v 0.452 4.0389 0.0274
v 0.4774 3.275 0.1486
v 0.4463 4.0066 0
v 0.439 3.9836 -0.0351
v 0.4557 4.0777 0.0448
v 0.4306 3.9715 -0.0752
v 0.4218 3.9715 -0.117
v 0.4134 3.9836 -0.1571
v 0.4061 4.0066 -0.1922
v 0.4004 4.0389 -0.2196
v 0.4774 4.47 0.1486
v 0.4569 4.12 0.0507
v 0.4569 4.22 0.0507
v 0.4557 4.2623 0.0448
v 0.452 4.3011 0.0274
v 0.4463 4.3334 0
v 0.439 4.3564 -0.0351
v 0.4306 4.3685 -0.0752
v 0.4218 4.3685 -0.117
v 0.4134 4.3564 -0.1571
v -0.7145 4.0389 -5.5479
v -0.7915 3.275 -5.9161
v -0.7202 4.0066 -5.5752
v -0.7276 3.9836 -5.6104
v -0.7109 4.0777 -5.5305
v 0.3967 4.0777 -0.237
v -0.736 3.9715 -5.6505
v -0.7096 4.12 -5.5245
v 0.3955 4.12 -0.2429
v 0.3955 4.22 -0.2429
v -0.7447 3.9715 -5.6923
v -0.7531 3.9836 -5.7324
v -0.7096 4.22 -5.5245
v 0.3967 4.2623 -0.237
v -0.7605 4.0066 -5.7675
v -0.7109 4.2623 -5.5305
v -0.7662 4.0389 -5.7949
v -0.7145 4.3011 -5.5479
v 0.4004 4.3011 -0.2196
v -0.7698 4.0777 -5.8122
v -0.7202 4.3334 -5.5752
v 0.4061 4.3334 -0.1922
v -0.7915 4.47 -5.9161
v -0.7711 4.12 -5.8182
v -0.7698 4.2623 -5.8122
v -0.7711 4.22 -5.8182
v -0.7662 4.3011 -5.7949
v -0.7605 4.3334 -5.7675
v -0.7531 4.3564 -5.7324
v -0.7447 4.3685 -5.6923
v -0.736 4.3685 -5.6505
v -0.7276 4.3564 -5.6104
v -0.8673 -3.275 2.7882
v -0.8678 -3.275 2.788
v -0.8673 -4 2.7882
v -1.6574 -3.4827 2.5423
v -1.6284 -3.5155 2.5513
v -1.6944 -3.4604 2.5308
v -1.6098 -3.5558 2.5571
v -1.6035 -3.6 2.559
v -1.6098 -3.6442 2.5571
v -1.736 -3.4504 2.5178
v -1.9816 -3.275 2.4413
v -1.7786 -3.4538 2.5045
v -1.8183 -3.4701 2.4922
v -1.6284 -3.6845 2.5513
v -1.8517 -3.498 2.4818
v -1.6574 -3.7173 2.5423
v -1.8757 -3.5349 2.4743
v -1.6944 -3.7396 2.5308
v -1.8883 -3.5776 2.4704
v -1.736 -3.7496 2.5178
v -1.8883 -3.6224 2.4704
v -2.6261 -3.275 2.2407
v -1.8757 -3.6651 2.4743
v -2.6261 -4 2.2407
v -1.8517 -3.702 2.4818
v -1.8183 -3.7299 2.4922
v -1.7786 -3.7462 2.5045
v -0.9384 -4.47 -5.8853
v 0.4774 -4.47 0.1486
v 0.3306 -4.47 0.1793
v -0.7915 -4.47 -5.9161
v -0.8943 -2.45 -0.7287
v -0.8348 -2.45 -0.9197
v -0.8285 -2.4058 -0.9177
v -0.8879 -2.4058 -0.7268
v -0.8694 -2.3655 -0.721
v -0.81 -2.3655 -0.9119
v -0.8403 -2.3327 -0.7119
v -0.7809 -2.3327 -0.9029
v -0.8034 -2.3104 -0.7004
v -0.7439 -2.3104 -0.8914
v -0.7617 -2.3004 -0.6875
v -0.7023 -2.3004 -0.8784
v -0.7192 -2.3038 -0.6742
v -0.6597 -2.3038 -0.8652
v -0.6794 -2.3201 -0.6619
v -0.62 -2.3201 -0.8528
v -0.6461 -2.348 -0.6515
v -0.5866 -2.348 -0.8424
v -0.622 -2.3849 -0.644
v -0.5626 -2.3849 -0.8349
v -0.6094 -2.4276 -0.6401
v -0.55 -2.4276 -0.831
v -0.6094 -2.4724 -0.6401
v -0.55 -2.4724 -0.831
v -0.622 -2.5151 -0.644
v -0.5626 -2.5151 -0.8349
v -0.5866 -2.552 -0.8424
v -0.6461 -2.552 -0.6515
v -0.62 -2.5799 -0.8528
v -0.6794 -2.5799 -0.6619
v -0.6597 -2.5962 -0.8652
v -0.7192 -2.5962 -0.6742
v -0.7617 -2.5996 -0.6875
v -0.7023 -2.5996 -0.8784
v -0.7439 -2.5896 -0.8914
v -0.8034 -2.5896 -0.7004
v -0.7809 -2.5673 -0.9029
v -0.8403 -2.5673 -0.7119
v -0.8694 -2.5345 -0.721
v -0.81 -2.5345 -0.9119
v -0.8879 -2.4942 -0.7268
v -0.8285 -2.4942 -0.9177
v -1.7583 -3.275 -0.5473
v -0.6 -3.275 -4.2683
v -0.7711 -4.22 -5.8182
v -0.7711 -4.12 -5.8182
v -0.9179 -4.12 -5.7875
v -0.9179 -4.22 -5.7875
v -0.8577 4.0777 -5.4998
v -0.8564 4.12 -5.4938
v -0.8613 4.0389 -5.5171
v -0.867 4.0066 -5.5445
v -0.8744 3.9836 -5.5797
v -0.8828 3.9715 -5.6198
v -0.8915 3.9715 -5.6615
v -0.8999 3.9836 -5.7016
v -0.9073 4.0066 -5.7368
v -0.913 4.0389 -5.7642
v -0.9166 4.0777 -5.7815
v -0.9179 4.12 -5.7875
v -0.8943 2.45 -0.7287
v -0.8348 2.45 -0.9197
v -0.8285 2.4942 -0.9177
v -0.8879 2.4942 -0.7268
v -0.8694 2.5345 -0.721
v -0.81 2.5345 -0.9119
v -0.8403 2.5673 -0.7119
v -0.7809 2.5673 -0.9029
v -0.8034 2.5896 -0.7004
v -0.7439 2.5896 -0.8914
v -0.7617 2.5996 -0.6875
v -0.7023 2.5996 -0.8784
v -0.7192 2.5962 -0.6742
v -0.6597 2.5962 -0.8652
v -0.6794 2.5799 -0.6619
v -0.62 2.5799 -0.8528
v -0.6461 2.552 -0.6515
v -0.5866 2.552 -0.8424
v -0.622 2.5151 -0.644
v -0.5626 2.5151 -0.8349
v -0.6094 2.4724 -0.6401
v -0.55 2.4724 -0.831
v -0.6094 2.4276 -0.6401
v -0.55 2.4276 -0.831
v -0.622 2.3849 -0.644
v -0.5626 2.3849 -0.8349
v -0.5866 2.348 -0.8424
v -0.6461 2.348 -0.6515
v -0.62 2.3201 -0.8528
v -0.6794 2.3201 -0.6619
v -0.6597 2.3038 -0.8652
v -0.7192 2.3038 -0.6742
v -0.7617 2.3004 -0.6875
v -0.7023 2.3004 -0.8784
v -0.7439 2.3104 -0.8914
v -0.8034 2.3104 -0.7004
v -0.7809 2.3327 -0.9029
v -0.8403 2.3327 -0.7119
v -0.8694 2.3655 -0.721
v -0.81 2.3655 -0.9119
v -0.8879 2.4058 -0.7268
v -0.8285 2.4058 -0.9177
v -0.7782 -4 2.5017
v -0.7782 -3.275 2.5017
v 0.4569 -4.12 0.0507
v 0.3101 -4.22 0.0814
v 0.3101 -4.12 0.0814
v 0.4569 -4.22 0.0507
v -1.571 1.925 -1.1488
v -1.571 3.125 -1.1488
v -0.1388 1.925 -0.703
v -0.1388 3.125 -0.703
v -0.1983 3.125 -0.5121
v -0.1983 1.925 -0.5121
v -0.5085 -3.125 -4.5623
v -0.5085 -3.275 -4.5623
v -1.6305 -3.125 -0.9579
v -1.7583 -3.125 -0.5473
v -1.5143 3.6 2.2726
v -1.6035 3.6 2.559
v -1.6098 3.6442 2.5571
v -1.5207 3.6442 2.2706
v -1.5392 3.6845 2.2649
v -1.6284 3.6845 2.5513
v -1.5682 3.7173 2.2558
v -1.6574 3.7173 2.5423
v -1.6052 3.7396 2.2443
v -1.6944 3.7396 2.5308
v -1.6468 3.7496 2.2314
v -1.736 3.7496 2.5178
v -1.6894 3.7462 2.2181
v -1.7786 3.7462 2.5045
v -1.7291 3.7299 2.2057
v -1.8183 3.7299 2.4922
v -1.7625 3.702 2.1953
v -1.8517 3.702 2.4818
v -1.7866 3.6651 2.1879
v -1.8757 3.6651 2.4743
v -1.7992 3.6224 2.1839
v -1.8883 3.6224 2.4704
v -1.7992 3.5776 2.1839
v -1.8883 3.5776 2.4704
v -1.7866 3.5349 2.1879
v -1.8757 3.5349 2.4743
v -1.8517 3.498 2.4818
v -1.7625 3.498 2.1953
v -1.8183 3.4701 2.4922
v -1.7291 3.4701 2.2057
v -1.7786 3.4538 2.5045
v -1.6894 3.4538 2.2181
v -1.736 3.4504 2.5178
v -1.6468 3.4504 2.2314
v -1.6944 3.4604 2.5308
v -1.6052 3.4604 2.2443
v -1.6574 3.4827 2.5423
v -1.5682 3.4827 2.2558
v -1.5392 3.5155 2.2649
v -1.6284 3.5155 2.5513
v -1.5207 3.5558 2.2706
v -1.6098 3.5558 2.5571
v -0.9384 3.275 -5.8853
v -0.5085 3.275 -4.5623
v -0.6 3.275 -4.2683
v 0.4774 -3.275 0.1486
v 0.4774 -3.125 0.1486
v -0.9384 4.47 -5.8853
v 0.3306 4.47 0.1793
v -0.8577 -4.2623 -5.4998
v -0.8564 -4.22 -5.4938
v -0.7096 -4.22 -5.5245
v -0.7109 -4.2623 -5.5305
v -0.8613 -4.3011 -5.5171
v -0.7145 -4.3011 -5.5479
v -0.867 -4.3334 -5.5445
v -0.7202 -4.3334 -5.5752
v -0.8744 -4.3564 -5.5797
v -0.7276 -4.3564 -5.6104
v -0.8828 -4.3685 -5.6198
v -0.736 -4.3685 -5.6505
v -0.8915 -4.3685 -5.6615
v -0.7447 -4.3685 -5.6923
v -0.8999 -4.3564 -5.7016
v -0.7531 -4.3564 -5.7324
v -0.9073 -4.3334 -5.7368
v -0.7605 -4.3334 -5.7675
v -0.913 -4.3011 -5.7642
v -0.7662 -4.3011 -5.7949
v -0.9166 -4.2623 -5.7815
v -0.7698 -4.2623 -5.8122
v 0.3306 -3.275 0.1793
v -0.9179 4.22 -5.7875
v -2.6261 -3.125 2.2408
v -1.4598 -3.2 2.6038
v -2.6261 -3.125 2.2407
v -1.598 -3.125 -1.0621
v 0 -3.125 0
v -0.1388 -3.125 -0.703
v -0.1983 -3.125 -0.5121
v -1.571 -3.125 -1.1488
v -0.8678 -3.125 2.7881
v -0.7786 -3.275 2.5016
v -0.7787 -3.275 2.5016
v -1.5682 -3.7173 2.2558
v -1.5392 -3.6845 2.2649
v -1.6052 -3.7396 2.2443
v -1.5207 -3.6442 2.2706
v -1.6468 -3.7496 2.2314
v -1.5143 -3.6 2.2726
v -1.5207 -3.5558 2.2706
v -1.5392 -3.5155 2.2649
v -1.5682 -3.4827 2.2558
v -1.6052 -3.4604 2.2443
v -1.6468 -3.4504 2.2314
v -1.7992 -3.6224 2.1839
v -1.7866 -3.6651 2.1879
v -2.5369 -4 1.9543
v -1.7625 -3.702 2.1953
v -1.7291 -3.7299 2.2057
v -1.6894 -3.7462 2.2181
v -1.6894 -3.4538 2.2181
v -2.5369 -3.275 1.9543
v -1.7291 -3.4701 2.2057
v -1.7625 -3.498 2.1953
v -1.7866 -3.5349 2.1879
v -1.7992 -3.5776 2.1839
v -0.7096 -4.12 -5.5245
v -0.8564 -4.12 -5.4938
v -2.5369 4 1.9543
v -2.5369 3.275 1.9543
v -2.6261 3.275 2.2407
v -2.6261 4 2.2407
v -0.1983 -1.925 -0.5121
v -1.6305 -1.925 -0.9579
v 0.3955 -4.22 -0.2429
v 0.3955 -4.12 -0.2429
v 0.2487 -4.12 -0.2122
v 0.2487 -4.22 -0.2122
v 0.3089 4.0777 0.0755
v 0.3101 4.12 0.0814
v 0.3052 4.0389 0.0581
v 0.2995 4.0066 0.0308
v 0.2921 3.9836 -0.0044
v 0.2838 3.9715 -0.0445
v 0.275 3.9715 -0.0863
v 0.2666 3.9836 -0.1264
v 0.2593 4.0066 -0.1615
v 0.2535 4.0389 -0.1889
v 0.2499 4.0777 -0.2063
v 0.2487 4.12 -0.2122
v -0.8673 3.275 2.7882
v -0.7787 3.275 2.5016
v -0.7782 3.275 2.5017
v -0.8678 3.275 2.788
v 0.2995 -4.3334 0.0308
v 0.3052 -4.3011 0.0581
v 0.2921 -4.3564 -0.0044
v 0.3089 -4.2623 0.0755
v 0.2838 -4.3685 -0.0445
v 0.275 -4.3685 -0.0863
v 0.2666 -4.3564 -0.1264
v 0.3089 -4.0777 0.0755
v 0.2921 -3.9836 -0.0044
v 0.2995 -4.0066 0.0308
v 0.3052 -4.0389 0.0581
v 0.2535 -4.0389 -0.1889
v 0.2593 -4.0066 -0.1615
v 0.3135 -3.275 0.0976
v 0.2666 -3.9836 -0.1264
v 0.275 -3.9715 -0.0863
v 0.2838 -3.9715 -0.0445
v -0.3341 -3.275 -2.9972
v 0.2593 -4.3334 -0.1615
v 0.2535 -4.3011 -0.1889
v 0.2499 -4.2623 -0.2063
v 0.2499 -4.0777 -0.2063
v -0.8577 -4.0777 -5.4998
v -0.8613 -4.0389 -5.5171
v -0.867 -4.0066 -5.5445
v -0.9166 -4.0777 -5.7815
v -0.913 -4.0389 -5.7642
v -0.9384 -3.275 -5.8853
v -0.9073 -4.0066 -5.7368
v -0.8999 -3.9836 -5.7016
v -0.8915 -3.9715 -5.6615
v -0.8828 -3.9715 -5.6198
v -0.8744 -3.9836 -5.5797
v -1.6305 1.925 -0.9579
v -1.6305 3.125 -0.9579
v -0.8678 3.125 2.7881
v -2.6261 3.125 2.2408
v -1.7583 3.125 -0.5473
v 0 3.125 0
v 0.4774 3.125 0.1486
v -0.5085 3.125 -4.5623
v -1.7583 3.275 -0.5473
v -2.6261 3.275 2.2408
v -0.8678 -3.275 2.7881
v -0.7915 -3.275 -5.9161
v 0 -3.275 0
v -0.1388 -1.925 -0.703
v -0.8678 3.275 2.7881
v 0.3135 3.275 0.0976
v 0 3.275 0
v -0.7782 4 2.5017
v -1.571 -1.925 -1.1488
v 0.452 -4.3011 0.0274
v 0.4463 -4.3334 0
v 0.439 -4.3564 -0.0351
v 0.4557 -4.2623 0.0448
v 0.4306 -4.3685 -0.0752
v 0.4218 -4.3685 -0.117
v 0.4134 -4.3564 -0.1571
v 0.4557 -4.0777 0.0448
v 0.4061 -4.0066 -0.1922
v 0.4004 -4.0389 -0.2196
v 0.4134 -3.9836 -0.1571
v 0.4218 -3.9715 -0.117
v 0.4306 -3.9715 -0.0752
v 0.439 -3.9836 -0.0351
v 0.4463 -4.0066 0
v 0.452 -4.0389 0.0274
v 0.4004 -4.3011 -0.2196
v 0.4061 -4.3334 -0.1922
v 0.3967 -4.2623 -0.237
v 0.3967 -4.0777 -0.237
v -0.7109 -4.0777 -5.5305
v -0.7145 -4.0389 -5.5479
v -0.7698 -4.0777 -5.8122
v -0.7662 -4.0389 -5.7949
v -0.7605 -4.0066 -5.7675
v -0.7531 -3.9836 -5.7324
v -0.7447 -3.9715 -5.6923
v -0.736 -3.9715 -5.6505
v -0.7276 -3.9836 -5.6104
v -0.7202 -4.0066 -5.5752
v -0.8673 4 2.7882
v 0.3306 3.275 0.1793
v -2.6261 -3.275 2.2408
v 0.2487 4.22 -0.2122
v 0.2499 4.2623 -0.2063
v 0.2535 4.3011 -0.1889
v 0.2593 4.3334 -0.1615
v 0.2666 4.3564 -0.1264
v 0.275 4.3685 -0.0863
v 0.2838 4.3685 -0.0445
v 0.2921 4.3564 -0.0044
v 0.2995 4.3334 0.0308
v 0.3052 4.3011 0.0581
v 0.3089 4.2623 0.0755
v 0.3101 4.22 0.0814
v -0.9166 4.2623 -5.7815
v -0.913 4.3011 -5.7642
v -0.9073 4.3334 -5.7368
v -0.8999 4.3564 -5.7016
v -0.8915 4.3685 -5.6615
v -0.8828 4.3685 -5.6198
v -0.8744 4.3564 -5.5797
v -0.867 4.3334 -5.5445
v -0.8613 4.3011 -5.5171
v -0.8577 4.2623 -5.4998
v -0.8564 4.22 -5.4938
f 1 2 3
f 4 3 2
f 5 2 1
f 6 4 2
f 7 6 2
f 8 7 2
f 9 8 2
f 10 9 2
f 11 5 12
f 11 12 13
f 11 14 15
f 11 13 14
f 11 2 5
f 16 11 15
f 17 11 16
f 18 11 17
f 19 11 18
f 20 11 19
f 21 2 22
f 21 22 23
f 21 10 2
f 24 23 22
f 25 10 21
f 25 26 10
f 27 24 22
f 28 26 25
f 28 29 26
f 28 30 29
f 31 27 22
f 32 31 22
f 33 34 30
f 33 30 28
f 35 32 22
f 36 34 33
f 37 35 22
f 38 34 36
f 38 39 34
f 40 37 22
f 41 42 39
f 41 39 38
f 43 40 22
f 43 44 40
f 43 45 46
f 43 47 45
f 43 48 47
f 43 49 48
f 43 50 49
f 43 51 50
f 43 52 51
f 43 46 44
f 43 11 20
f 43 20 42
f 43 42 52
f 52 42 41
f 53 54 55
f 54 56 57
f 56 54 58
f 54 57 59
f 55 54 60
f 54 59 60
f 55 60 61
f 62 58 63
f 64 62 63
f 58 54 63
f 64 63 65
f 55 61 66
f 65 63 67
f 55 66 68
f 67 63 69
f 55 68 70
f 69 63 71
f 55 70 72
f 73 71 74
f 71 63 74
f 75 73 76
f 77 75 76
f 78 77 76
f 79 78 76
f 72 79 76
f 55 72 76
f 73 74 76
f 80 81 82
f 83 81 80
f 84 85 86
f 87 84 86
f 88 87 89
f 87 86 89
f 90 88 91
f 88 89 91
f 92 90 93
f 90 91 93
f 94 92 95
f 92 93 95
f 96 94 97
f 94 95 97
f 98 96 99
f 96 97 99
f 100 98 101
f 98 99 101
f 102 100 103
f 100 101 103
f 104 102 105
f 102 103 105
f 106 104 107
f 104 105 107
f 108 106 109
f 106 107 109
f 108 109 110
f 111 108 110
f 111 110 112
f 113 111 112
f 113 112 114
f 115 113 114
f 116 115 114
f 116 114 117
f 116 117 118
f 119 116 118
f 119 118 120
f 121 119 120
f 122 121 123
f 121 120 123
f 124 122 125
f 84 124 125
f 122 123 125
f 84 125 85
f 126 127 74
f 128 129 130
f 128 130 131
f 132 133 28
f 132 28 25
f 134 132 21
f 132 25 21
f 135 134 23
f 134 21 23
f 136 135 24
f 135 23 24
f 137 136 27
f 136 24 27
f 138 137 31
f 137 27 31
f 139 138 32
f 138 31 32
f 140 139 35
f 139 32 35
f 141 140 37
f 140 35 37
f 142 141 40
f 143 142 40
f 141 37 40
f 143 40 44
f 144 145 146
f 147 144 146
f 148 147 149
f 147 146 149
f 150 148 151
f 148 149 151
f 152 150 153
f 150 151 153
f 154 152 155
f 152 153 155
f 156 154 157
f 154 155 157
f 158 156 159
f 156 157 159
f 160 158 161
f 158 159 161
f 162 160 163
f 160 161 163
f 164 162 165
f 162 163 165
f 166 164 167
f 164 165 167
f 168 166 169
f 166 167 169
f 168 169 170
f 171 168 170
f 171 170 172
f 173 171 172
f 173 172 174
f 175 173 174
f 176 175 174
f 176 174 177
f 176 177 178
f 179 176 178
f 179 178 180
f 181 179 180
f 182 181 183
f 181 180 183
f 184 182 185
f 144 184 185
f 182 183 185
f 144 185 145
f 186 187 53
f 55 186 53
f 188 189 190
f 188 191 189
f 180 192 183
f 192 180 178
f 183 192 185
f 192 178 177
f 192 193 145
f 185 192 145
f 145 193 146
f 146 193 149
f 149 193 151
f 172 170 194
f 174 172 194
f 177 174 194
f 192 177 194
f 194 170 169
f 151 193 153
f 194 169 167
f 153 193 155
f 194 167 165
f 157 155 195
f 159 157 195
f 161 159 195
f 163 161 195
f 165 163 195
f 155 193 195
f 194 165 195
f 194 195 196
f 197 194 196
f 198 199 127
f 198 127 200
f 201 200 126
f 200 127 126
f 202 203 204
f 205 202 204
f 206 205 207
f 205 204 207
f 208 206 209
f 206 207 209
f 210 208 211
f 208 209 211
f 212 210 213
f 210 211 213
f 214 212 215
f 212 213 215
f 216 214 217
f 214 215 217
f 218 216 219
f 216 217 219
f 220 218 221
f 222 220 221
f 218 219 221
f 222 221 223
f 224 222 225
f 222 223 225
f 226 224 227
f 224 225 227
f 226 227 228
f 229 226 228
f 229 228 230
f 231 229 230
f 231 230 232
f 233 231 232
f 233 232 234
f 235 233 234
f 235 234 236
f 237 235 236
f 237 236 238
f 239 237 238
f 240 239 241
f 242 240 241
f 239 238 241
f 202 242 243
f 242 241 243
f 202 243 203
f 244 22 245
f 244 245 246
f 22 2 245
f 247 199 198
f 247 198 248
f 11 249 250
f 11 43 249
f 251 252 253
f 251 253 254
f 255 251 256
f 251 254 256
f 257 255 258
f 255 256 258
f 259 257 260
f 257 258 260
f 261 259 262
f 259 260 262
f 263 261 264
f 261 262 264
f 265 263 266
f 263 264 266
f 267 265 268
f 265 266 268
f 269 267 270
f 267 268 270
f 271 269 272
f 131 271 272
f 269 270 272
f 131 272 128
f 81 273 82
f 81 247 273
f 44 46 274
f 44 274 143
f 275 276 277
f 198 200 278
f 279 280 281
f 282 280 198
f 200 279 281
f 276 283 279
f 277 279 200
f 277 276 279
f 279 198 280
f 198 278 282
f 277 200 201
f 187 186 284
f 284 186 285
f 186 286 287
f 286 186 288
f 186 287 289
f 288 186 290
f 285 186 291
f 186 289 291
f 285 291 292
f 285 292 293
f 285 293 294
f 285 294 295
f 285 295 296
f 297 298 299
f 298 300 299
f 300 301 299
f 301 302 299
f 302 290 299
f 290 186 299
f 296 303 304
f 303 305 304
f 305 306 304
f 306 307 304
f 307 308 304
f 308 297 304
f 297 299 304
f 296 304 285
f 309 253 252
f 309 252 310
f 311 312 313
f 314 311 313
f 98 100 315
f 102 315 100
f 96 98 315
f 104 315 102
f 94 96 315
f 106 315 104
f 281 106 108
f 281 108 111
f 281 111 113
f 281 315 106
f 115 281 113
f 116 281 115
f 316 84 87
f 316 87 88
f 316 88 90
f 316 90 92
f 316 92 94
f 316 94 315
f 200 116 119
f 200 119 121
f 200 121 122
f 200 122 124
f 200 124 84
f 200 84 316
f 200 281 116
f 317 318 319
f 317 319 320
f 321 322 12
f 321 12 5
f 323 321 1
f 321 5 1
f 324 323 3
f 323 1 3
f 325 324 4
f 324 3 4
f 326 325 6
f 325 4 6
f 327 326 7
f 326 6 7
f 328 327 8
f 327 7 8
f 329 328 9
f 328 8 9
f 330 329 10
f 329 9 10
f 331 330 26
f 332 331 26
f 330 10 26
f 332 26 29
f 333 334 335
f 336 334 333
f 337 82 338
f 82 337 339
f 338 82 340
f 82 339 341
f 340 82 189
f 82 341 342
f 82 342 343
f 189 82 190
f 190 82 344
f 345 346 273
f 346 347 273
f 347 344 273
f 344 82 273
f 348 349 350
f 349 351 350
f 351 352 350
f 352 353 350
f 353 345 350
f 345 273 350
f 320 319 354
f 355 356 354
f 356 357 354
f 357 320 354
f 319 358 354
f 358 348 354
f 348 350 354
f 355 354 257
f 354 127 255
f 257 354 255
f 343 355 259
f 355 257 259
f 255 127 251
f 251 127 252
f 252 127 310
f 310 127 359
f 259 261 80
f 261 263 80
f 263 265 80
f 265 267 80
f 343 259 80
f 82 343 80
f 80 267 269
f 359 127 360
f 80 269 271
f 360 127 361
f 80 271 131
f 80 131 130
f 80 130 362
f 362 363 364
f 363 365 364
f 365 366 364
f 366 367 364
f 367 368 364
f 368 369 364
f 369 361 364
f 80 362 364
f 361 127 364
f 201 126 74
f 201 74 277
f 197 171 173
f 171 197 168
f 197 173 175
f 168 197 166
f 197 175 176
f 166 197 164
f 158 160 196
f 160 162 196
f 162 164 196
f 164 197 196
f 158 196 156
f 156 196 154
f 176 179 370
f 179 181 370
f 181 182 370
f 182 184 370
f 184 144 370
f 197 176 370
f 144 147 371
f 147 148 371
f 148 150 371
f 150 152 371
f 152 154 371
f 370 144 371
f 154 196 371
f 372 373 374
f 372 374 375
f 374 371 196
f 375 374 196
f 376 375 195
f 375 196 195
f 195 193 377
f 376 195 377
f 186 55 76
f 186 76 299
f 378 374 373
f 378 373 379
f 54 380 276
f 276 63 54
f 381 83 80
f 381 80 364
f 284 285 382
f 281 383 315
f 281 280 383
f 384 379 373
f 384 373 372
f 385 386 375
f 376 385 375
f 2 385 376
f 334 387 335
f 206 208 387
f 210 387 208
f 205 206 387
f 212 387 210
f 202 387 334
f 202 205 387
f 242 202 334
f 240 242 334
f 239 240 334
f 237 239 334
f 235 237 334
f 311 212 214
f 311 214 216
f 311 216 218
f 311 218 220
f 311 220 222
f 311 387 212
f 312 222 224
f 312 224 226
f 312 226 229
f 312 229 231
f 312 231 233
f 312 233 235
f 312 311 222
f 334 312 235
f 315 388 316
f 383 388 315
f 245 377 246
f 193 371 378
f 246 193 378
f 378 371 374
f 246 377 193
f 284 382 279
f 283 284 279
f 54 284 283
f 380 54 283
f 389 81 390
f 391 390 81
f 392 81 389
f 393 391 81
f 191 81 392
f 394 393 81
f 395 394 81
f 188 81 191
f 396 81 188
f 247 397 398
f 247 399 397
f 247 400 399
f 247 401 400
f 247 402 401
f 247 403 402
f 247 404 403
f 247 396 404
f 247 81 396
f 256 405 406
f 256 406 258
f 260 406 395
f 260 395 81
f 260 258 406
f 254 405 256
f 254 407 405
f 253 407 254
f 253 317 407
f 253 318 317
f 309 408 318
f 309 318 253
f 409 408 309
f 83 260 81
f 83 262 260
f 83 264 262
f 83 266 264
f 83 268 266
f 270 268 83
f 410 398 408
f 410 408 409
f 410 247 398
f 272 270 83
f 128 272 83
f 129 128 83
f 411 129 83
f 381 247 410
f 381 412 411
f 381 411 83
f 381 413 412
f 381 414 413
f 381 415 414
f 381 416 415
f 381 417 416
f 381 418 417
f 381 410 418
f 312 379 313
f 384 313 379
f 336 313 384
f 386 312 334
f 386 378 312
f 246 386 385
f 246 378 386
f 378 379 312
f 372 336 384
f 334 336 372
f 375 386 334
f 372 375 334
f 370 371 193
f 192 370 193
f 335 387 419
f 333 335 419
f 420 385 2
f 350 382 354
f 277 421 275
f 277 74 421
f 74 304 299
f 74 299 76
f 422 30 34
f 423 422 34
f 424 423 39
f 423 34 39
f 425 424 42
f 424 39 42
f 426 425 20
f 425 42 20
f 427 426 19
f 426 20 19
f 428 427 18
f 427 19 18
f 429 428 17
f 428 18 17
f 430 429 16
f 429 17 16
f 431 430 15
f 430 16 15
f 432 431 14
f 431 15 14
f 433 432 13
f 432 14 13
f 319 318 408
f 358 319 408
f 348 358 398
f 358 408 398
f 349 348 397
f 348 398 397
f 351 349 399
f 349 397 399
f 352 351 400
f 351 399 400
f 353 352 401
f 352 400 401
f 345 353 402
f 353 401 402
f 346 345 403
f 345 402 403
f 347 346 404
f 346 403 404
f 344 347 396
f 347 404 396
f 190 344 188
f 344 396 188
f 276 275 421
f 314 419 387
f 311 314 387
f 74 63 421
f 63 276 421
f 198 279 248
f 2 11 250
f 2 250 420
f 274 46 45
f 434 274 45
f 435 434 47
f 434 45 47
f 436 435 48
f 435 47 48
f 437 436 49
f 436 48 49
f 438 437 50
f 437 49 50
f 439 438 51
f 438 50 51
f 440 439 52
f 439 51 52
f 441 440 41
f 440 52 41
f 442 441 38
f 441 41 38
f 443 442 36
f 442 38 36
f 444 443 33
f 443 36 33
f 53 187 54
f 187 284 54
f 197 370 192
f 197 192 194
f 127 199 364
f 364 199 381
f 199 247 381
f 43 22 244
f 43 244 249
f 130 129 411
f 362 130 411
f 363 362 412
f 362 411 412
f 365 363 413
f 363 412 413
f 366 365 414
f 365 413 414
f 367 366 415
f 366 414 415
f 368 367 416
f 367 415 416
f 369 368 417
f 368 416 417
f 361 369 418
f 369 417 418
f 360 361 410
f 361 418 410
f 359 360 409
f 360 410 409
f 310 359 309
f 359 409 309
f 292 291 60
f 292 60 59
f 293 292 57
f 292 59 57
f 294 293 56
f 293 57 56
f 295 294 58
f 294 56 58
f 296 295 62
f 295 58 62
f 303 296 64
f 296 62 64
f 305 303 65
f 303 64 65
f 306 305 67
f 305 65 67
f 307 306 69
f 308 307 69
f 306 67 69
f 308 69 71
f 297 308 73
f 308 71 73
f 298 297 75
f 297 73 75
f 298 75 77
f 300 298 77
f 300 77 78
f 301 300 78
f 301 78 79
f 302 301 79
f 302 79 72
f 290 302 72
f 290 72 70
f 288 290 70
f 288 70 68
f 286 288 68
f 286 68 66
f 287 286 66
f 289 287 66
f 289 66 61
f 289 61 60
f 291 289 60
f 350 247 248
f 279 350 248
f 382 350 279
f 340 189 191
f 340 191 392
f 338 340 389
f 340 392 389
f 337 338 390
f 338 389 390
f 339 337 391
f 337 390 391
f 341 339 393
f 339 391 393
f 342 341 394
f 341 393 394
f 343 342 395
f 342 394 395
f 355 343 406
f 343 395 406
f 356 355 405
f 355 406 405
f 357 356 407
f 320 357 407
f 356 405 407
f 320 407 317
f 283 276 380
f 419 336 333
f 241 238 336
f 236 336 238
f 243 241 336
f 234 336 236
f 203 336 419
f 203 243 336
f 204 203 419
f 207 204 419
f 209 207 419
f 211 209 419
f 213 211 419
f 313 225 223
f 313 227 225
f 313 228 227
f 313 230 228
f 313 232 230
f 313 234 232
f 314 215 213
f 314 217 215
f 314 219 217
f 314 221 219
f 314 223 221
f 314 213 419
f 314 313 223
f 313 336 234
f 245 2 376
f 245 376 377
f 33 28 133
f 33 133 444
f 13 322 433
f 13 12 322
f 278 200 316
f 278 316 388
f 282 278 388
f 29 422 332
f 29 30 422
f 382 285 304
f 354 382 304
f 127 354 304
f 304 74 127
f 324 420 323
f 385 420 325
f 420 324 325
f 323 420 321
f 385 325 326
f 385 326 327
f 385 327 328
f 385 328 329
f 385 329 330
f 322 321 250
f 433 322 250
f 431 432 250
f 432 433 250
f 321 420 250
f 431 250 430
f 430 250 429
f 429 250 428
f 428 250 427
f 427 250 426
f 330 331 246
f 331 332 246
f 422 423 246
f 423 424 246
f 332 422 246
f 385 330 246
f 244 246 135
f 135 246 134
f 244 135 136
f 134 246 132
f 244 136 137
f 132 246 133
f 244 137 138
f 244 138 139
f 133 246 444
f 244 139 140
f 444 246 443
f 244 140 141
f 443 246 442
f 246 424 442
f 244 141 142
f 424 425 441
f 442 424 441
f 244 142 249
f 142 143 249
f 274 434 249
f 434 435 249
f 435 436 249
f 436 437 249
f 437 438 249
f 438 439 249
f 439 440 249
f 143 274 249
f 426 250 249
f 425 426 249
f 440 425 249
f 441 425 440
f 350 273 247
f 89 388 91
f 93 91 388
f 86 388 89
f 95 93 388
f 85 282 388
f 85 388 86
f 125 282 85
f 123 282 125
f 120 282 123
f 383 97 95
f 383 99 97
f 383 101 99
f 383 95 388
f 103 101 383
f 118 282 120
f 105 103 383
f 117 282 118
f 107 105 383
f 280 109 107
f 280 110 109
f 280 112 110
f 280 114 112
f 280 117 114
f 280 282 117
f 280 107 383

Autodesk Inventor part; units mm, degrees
ref_plane "Plano de trabajo1" through (0, 3.2, 0) normal (0, 1, 0) x (-1, 0, 0)
ref_plane "Plano de trabajo2" through (0, -3.2, 0) normal (0, 1, 0) x (-1, 0, 0)
sketch "Boceto3" plane through (0, 3.2, 0) normal (0, 1, 0) x (-1, 0, 0)
  line L0 (0, -6.196) -> (0, 0) projected
  line L1 (0, -6.196) -> (1.7583, -0.5473) projected
  line L2 (1.7583, -0.5473) -> (0, 0) projected
sketch "Boceto4" plane through (0, -3.2, 0) normal (0, 1, 0) x (-1, 0, 0)
  line L0 (0, -6.196) -> (0, 0) projected
  line L1 (0, -6.196) -> (1.7583, -0.5473) projected
  line L2 (1.7583, -0.5473) -> (0, 0) projected
extrude "Extrusión3" add sketch "Boceto4" along normal mid plane 0.15
extrude "Extrusión4" add sketch "Boceto3" along normal mid plane 0.15
ref_plane "Plano de trabajo3" through (0, -3.275, 0) normal (-0.2972, 0, 0.9548) x (0.9548, 0, 0.2972)
sketch "Boceto7" plane through (0, -3.275, 0) normal (-0.2972, 0, 0.9548) x (0.9548, 0, 0.2972)
  line L0 (-1.8415, 0.15) -> (0, 0.15) projected
  line L1 (-1.8415, 0) -> (-1.8415, 0.15) projected
  line L2 (0, 0) -> (-1.8415, 0) projected
  line L3 (-1.8415, 6.55) -> (0, 6.55) projected
  line L4 (-1.8415, 6.4) -> (-1.8415, 6.55) projected
  line L5 (0, 6.4) -> (-1.8415, 6.4) projected
  line L6 (0, 0.15) -> (0, 0) projected
  line L7 (0, 6.55) -> (0, 6.4) projected
  point P0 (0, 3.275)
extrude "Extrusión7" add sketch "Boceto7" along normal blind 2.92
sketch "Boceto8" plane through (0, 3.275, -6.196) normal (-0.9548, 0, -0.2972) x (-0.2972, 0, 0.9548)
  line L0 (0, -6.4) -> (8.836, -6.4) projected
  line L1 (0, -6.55) -> (8.836, -6.55) projected
  line L2 (0, 0) -> (8.836, 0) projected
  line L3 (0, -0.15) -> (8.836, -0.15) projected
  line L4 (8.836, -6.55) -> (8.836, -7.275)
  line L5 (8.836, -7.275) -> (8.536, -7.275)
  line L6 (8.536, -7.275) -> (8.536, -6.55)
  line L7 (5.916, -6.55) -> (8.836, -6.55) projected
  line L8 (8.836, -6.55) -> (8.536, -6.55)
  line L9 (8.916, -0.15) -> (8.916, 0) projected
  line L10 (8.836, 0) -> (8.836, 0.725)
  line L11 (8.836, 0.725) -> (8.536, 0.725)
  line L12 (8.536, 0.725) -> (8.536, 0)
  line L13 (8.536, 0) -> (8.836, 0)
  line L14 (0, -0.15) -> (0, 0) projected
  line L15 (0, -6.55) -> (0, -6.4) projected
  line L16 (8.836, 0) -> (8.836, -0.15) projected
  line L17 (8.836, -6.4) -> (8.836, -6.55) projected
  point P0 (5.916, -3.275)
  dimension "d19" = 0.725
  dimension "d20" = 0.3
  dimension "d21" = 0.725
  dimension "d22" = 0.3
extrude "Extrusión8" add sketch "Boceto8" against normal blind 1.842 contours L4 L5 L6 L1 | L12 L11 L10 L2
sketch "Boceto9" plane through (-0.8678, -3.275, 2.7881) normal (-0.2972, 0, 0.9548) x (0.9548, 0, 0.2972)
  line L0 (0, 0.15) -> (-1.8415, 0.15) projected
  line L1 (-1.8415, 0.15) -> (-1.8415, -0.725) projected
  line L2 (-1.8415, -0.725) -> (0.0005, -0.725) projected
  line L3 (0.0005, 0) -> (0.0005, -0.725) projected
  line L4 (0, 0) -> (0.0005, 0) projected
  line L5 (0, 6.55) -> (0.0005, 6.55) projected
  line L6 (0.0005, 7.275) -> (0.0005, 6.55) projected
  line L7 (-1.8415, 7.275) -> (0.0005, 7.275) projected
  line L8 (-1.8415, 6.4) -> (-1.8415, 7.275) projected
  line L9 (-1.8415, 6.4) -> (0, 6.4) projected
  circle A0 centre (-0.9205, -0.325) radius 0.15
  circle A1 centre (-0.9205, 6.875) radius 0.15
  line L10 (0, 6.4) -> (0, 6.55) projected
  line L11 (0, 0) -> (0, 0.15) projected
  point P0 (0, 3.275)
  dimension "d27" = 0.3
  dimension "d28" = 0.3
extrude "Extrusión9" cut sketch "Boceto9" against normal blind 1.842 contours A0 | A1
ref_plane "Plano de trabajo5" through (0, 1.925, -0.8902) normal (0.2972, 0, -0.9548) x (-0.9548, 0, -0.2972)
sketch "Boceto12" plane through (0, 1.925, -0.8902) normal (0.2972, 0, -0.9548) x (-0.9548, 0, -0.2972)
  line L0 (3.1538, -5.05) -> (3.1538, -3.85) projected
  line L1 (1.5769, -3.85) -> (3.1538, -3.85) projected
  line L2 (1.5769, -5.05) -> (1.5769, -3.85) projected
  line L3 (1.5769, 1.2) -> (1.5769, 0) projected
  line L4 (3.1538, 0) -> (1.5769, 0) projected
  line L5 (3.1538, 1.2) -> (3.1538, 0) projected
  line L6 (1.5769, -3.85) -> (3.1538, -3.85) projected
  circle A0 centre (0.6559, -5.525) radius 0.15 projected
  circle A1 centre (0.6559, 0.525) radius 0.15
  circle A2 centre (0.6559, -4.375) radius 0.15
  line L7 (3.1538, 1.2) -> (1.5769, 1.2) projected
  line L8 (1.5769, -5.05) -> (3.1538, -5.05) projected
  point P0 (-0.2646, -1.925)
  dimension "d41" = 0.3
  dimension "d42" = 0.3
extrude "Extrusión12" cut sketch "Boceto12" against normal blind 1.2 contours A1 | A2
ref_plane "Plano de trabajo4" through (-0.1783, -3.125, -0.4137) normal (-0.2972, 0, 0.9548) x (0.9548, 0, 0.2972)
sketch "Boceto13" plane through (-0.1783, -3.125, -0.4137) normal (-0.2972, 0, 0.9548) x (0.9548, 0, 0.2972)
  circle A0 centre (0.6273, -0.475) radius 0.15 projected
  circle A1 centre (0.6273, 6.725) radius 0.15 projected
  line L0 (0.6273, 6.725) -> (0.6273, -0.475)
  circle A2 centre (0.6273, 0.675) radius 0.15
  circle A3 centre (0.6273, 5.575) radius 0.15
  point P0 (-0.2932, 3.125)
  dimension "d50" = 0.3
  dimension "d51" = 0.3
extrude "Extrusión13" cut sketch "Boceto13" against normal blind 10 contours A3 L0 | L0 A3 | A2 L0 | L0 A2
sketch "Boceto14" plane through (0, 3.275, 0) normal (0, 1, 0) x (1, 0, 0)
  line L0 (-2.537, -1.9543) -> (-2.6261, -2.2407) projected
  line L1 (-2.537, -1.9543) -> (-0.3978, -2.6202)
  line L2 (0, 0) -> (2.1391, -0.6659)
  line L3 (0, 0) -> (0, 6.196) projected
  line L4 (0, 0) -> (0.4774, -0.1486)
  line L5 (0, 0) -> (-0.2806, 5.2944)
  line L6 (0, 6.196) -> (-2.6261, -2.2407) projected
  line L7 (-0.2806, 5.2944) -> (0, 6.196)
  line L8 (0, 6.196) -> (0, 0)
  line L9 (0, 0) -> (-0.7787, -2.5016) projected
  line L10 (-0.2806, 5.2944) -> (0, 0)
  line L11 (0, 0) -> (-0.3893, 4.9452)
  line L12 (-0.3893, 4.9452) -> (0, 6.196)
  line L13 (-0.2806, 5.2944) -> (-0.3893, 4.9452)
  line L14 (0, 0) -> (-0.5085, 4.5623)
  line L15 (0, 6.196) -> (-2.537, -1.9543) projected
  line L16 (-0.3893, 4.9452) -> (-0.5085, 4.5623)
  point P0 (-1.5675, 1.1603)
  dimension "d54" = 0.5
extrude "Extrusión14" cut sketch "Boceto14" against normal blind 10 contours L6 L11 L14 | L5 L6 L3 | L11 L6 L5
sketch "Boceto15" plane through (0, 3.275, 0) normal (0, 1, 0) x (1, 0, 0)
  line L0 (-0.0139, -0.0029) -> (2.134, -0.6398)
  line L1 (0, 0) -> (0.4774, -0.1486)
  line L2 (0, 0) -> (-0.7787, -2.5016)
  line L3 (0.4774, -0.1486) -> (-0.0139, -0.0029)
  line L4 (0, 0) -> (-0.7787, -2.5016) projected
  line L5 (0, 0) -> (0.4774, -0.1486)
  line L6 (0, 0) -> (-0.5085, 4.5623) projected
  line L7 (-0.5085, 4.5623) -> (0, 0) projected
  line L8 (0.4774, -0.1486) -> (-0.5085, 4.5623)
  line L9 (-0.5085, 4.5623) -> (0, 0)
  line L10 (-0.0139, -0.0029) -> (0.4774, -0.1486)
  line L11 (0.4774, -0.1486) -> (-0.5085, 4.5623)
  line L12 (-0.539, 4.708) -> (-0.0139, -0.0029)
  dimension "d57" = 0.5
extrude "Extrusión15" add sketch "Boceto15" against normal blind 0.15 contours L1 L6 L8
sketch "Boceto16" plane through (0, -3.275, 0) normal (0, -1, 0) x (1, 0, 0)
  line L0 (0, 0) -> (-0.8678, 2.7881) projected
  line L1 (-2.6261, 2.2407) -> (-0.8678, 2.7881) projected
  line L2 (-0.5085, -4.5623) -> (-2.6261, 2.2407) projected
  line L3 (-0.5085, -4.5623) -> (0.4774, 0.1486) projected
  line L4 (0.4774, 0.1486) -> (0, 0) projected
extrude "Extrusión16" add sketch "Boceto16" against normal blind 0.15
sketch "Boceto17" plane through (0, 3.125, 0) normal (0, -1, 0) x (1, 0, 0)
  line L0 (-2.6261, 2.2407) -> (-2.537, 1.9543) projected
  line L1 (-1.571, -1.1488) -> (-0.1388, -0.703)
  line L2 (-0.1388, -0.703) -> (-0.1983, -0.5121)
  line L3 (-0.1983, -0.5121) -> (-1.6305, -0.9579)
  line L4 (-1.6305, -0.9579) -> (-1.571, -1.1488)
  line L5 (-0.5085, -4.5623) -> (-2.537, 1.9543) projected
  line L6 (-1.571, -1.1488) -> (-0.1388, -0.703)
  line L7 (-0.1388, -0.703) -> (-0.1983, -0.5121)
  line L8 (-0.1983, -0.5121) -> (-1.6305, -0.9579)
  point P0 (0, 0)
  point P1 (-0.2806, -5.2944)
  point P2 (-0.3893, -4.9452)
  dimension "d62" = 3.55
  dimension "d63" = 1.5
  dimension "d64" = 0.2
extrude "Extrusión17" add sketch "Boceto17" along normal blind 1.2
sketch "Boceto18" plane through (0, -3.125, 0) normal (0, 1, 0) x (1, 0, 0)
  line L0 (-1.571, 1.1488) -> (-0.1388, 0.703) projected
  line L1 (-0.1388, 0.703) -> (-0.1983, 0.5121) projected
  line L2 (-0.1983, 0.5121) -> (-1.6305, 0.9579) projected
  line L3 (-1.6305, 0.9579) -> (-1.571, 1.1488) projected
  point P0 (0, 0)
extrude "Extrusión18" add sketch "Boceto18" along normal blind 1.2
sketch "Boceto19" plane through (-1.571, -3.125, -1.1488) normal (0.2972, 0, -0.9548) x (-0.9548, 0, -0.2972)
  circle A0 centre (-0.921, 6.725) radius 0.15 projected
  circle A1 centre (-0.921, -0.475) radius 0.15 projected
  circle A2 centre (-0.921, 5.575) radius 0.15
  circle A3 centre (-0.921, 0.675) radius 0.15
  point P0 (-1.8415, 3.125)
  dimension "d70" = 0.3
  dimension "d71" = 0.3
extrude "Extrusión19" cut sketch "Boceto19" against normal blind 1.2 contours A2 | A3
sketch "Boceto21" plane through (0.4774, 3.125, 0.1486) normal (0.9788, 0, -0.2048) x (-0.2048, 0, -0.9788)
  line L0 (0.2432, 0.15) -> (0, 0.15) projected
  arc A0 (6.096, -7.245) -> (5.796, -7.245) centre (5.946, -7.245) ccw
  line L1 (6.096, -7.245) -> (6.096, -7.345)
  arc A1 (5.796, -7.345) -> (6.096, -7.345) centre (5.946, -7.345) ccw
  line L2 (0, -7.595) -> (6.196, -7.595)
  line L3 (5.796, -7.345) -> (5.796, -7.245)
  arc A2 (0.4, -7.245) -> (0.1, -7.245) centre (0.25, -7.245) ccw
  line L4 (0.4, -7.245) -> (0.4, -7.345)
  arc A3 (0.1, -7.345) -> (0.4, -7.345) centre (0.25, -7.345) ccw
  line L5 (0.1, -7.345) -> (0.1, -7.245)
  line L6 (0.4, 1.095) -> (0.4, 0.995)
  line L7 (0.1, 0.995) -> (0.1, 1.095)
  arc A4 (0.4, 1.095) -> (0.1, 1.095) centre (0.25, 1.095) ccw
  arc A5 (5.796, 0.995) -> (6.096, 0.995) centre (5.946, 0.995) ccw
  line L8 (6.096, 1.095) -> (6.096, 0.995)
  arc A6 (6.096, 1.095) -> (5.796, 1.095) centre (5.946, 1.095) ccw
  line L9 (6.196, 1.345) -> (0, 1.345)
  arc A7 (0.1, 0.995) -> (0.4, 0.995) centre (0.25, 0.995) ccw
  line L10 (5.796, 0.995) -> (5.796, 1.095)
  line L11 (0, 0.15) -> (4.813, 0.15) projected
  line L12 (0, -6.4) -> (4.813, -6.4) projected
  line L13 (0, 0.15) -> (6.196, 0.15)
  line L14 (0, -6.4) -> (6.196, -6.4)
  line L15 (6.196, -7.595) -> (6.196, -6.4)
  line L16 (6.196, 0.15) -> (6.196, 1.345)
  line L17 (0, 1.345) -> (0, 0.15)
  line L18 (0, -6.4) -> (0, -7.595)
  point P0 (0, 1.345)
extrude "Extrusión21" add sketch "Boceto21" against normal blind 0.15
properties part number "soportePantalla"
